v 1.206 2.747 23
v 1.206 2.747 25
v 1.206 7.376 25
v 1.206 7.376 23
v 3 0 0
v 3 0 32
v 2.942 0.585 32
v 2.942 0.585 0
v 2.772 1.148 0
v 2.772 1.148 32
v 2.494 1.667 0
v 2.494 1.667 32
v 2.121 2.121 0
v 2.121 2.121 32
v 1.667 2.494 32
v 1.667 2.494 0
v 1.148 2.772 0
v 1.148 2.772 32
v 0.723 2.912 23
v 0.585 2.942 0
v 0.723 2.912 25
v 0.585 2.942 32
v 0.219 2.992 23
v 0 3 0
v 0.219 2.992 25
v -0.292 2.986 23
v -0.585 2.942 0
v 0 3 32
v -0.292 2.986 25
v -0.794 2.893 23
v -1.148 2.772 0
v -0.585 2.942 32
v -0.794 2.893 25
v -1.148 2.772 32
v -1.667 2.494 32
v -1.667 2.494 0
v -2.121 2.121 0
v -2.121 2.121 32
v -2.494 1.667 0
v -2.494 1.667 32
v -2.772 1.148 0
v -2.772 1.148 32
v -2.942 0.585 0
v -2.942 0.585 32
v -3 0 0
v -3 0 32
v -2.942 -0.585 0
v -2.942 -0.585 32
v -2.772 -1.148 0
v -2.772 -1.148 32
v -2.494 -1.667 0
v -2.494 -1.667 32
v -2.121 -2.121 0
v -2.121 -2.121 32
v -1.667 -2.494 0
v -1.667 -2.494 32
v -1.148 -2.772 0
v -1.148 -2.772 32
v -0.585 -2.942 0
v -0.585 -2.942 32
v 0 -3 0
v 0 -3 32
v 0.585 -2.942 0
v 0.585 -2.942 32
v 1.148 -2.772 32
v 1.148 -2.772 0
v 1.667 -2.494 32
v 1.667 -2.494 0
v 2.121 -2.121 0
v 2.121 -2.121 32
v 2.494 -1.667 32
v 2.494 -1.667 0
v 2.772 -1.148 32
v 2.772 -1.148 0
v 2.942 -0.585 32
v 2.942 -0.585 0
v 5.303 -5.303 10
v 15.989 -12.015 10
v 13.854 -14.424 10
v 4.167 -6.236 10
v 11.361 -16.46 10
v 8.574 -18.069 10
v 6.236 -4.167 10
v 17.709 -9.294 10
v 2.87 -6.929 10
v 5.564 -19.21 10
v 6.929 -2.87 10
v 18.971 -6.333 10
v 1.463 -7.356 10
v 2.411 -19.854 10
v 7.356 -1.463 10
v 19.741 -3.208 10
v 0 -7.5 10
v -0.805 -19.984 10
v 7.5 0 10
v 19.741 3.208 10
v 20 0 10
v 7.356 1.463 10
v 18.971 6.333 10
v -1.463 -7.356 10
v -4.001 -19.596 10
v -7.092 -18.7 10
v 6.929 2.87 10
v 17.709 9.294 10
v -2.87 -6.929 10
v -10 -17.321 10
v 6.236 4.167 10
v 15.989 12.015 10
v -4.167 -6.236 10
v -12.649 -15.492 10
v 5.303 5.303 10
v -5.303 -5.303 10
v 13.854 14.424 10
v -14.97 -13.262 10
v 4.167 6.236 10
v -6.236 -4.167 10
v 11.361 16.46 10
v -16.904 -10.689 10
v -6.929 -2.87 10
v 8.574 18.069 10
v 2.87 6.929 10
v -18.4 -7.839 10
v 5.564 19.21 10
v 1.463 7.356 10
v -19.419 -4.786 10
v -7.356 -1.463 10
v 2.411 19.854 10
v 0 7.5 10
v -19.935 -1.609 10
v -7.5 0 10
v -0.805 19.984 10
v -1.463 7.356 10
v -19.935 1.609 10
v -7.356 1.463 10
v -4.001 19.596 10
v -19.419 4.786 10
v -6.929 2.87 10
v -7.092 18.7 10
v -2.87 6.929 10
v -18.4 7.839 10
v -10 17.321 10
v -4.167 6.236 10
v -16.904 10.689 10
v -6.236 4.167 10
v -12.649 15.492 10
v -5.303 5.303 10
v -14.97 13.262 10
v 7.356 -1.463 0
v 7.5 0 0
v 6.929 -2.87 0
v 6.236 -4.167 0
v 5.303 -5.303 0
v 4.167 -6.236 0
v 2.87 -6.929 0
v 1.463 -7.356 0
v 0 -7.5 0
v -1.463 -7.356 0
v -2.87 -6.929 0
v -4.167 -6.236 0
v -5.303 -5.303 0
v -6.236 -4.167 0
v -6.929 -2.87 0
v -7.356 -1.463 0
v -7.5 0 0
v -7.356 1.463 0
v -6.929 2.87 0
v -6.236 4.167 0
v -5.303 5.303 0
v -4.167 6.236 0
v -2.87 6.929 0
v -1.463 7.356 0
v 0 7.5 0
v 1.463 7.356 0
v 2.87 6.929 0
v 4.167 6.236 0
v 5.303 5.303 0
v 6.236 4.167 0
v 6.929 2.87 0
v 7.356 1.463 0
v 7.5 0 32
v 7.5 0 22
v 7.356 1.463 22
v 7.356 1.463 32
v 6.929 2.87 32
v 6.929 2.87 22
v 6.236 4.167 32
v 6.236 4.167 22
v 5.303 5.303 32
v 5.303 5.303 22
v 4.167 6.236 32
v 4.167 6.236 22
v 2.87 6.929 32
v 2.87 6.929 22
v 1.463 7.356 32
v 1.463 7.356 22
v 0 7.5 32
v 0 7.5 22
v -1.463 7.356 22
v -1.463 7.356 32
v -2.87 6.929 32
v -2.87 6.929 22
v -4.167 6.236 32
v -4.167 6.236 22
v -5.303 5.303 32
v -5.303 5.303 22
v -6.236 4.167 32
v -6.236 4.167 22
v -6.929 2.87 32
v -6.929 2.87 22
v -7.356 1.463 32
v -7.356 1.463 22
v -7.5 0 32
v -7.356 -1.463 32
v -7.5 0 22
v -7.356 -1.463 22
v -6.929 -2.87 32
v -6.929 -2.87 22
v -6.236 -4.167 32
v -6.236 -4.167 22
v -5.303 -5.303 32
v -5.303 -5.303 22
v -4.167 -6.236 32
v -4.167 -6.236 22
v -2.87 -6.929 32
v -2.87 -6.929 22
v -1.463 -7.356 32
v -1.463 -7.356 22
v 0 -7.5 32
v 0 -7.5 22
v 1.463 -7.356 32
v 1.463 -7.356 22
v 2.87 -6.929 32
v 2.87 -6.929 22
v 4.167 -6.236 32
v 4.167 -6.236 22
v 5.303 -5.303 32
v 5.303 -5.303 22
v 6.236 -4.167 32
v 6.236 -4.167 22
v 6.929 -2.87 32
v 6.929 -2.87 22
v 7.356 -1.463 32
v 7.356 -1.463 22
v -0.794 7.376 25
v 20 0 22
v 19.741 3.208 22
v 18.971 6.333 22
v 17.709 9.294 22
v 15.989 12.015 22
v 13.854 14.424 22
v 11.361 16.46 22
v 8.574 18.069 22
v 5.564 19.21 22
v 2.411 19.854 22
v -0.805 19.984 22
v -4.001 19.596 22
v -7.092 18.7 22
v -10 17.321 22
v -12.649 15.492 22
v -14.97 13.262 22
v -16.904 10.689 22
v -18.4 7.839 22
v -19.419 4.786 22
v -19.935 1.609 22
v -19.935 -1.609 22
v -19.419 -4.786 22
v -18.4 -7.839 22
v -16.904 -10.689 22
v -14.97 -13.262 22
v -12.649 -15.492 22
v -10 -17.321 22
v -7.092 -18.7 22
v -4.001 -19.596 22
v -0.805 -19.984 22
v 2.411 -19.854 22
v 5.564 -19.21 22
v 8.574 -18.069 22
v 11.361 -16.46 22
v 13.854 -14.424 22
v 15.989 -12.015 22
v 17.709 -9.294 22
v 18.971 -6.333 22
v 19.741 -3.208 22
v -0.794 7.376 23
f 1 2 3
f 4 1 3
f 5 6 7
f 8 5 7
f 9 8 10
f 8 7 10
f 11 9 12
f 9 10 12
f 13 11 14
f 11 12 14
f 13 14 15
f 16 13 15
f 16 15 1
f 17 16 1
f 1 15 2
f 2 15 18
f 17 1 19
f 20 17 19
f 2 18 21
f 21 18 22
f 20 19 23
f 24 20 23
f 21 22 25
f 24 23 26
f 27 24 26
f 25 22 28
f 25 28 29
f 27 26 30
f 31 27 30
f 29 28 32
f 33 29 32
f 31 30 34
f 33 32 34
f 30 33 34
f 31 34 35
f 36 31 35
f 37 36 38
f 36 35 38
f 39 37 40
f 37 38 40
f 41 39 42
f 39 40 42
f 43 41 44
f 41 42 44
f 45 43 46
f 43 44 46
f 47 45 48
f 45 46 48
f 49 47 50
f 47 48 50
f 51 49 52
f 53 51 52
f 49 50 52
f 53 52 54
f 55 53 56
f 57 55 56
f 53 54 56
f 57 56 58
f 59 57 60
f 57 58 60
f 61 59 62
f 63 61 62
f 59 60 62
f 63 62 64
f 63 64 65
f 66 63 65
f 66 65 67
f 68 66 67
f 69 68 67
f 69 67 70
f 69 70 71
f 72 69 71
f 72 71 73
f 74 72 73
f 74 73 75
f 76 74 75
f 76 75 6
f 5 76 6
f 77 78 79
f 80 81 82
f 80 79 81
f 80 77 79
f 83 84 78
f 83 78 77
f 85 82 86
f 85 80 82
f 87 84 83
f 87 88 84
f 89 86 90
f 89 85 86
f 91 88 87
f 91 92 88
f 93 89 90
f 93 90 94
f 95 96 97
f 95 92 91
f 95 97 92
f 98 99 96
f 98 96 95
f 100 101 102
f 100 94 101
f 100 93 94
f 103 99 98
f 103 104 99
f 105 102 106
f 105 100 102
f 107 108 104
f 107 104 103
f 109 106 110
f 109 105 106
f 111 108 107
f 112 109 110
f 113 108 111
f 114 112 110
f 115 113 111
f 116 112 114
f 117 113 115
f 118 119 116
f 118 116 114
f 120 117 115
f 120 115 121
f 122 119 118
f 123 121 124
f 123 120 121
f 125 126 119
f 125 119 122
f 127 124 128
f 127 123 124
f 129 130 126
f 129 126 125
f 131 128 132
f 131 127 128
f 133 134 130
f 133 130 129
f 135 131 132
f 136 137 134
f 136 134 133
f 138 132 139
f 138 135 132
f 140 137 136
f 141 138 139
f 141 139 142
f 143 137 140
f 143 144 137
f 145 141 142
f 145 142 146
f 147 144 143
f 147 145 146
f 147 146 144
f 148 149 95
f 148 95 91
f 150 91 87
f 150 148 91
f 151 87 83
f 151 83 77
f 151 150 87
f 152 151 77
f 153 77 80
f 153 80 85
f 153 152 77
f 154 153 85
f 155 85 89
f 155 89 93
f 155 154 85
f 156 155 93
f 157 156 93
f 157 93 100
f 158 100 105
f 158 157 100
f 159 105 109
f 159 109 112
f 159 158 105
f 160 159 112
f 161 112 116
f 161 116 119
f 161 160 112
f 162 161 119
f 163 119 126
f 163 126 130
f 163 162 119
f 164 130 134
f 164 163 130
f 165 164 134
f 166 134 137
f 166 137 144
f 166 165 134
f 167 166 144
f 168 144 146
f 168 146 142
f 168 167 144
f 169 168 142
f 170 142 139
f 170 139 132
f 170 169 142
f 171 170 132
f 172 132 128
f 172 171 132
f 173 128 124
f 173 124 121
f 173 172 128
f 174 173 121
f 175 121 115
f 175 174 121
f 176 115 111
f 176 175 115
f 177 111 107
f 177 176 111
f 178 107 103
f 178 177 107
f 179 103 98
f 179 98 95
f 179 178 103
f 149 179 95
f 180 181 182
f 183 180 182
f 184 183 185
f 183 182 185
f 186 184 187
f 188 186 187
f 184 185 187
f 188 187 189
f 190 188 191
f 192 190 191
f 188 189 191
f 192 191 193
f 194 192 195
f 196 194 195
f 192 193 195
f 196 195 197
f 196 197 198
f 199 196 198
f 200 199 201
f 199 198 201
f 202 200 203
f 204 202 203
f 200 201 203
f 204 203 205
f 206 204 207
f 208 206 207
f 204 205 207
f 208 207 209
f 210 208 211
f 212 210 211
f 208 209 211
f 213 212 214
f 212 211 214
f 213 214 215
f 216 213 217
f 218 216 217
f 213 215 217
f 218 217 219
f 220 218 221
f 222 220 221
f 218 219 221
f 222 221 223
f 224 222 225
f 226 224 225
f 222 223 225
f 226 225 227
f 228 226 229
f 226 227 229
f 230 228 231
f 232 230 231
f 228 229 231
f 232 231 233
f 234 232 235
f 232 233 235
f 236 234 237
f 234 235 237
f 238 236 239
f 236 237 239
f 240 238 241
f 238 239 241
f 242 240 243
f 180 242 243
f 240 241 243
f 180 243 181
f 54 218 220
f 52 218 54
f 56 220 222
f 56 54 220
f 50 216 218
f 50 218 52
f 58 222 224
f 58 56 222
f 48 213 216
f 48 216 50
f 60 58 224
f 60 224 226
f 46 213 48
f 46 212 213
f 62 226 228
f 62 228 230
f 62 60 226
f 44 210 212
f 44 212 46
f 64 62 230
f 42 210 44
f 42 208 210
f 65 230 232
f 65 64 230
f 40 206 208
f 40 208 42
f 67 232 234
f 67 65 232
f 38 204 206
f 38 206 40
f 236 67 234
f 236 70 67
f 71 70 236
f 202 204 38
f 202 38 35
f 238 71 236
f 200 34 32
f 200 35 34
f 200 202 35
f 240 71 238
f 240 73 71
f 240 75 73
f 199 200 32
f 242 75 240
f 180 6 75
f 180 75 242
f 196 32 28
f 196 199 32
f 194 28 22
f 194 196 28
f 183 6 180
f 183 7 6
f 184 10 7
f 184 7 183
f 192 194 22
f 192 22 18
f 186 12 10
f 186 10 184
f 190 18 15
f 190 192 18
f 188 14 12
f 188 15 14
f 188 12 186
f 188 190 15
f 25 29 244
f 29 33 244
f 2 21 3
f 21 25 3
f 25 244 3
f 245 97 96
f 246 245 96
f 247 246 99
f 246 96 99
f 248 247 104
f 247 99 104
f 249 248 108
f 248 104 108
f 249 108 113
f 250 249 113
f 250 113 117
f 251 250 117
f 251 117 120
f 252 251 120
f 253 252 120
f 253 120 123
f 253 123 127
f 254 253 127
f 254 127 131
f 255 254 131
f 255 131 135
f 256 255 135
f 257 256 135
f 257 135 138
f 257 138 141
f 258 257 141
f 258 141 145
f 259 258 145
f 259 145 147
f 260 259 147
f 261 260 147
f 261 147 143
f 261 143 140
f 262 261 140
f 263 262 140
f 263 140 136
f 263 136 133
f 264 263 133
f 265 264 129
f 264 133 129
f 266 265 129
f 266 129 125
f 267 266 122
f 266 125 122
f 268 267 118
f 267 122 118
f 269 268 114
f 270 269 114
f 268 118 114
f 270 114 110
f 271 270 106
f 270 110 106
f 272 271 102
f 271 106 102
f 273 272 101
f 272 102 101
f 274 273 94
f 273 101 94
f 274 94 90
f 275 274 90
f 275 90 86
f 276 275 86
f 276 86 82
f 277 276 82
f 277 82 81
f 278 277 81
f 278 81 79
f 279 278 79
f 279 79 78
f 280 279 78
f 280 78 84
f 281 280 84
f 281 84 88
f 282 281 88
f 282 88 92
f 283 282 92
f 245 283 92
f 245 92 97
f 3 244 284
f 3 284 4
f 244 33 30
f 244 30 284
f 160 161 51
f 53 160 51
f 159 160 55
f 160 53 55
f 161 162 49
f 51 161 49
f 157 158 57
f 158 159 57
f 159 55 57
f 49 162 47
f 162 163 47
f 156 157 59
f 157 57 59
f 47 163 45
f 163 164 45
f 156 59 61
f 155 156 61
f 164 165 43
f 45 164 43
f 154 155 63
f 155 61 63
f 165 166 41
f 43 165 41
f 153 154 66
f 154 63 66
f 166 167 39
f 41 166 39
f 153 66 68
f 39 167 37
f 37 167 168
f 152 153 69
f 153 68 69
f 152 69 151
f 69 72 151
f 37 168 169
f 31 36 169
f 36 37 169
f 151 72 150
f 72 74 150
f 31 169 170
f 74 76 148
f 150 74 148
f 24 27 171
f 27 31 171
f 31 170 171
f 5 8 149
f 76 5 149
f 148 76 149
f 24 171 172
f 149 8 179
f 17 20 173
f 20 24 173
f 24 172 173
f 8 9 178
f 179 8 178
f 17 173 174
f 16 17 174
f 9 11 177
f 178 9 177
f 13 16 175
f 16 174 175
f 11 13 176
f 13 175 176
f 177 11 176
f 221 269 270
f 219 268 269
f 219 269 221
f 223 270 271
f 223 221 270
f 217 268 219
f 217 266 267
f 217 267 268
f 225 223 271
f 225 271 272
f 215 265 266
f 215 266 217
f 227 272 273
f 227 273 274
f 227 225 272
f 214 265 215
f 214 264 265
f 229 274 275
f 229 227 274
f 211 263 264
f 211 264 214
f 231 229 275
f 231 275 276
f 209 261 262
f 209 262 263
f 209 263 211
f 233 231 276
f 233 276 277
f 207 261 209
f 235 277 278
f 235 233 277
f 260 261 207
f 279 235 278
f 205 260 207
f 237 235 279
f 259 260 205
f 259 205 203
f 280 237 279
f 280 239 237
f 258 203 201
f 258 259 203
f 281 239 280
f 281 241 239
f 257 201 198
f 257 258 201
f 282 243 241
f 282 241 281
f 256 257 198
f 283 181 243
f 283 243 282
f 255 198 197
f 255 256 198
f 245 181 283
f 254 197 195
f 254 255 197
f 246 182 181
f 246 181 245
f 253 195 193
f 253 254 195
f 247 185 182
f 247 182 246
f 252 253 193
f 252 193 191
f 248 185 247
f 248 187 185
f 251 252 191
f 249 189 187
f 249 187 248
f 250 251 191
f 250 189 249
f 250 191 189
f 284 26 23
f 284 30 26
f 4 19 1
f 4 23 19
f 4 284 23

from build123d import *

# Parameters (mm, degrees)
SKETCH1_R           = 20
BOSS_EXTRUDE1_DEPTH = 32
SKETCH2_R           = 3
CUT_EXTRUDE1_DEPTH  = 32
CUT_EXTRUDE2_START  = -10
SKETCH3_R           = 20
SKETCH3_R_2         = 7.5
CUT_EXTRUDE2_DEPTH  = 10
SKETCH4_R           = 20
SKETCH4_R_2         = 7.5
CUT_EXTRUDE3_DEPTH  = 10
CUT_EXTRUDE4_START  = -7
SKETCH6_W           = 2
SKETCH6_H           = 4.833484819
CUT_EXTRUDE4_DEPTH  = 2


with BuildPart() as part:
    # Sketch1 → Boss-Extrude1 (new body)
    with BuildSketch(Plane.XY):
        Circle(SKETCH1_R)
    extrude(amount=BOSS_EXTRUDE1_DEPTH)

    # Sketch2 → Cut-Extrude1 (cut)
    with BuildSketch(Plane.XY.offset(32)):
        Circle(SKETCH2_R)
    extrude(amount=-CUT_EXTRUDE1_DEPTH, mode=Mode.SUBTRACT)

    # Sketch3 → Cut-Extrude2 (cut)
    with BuildSketch(Plane.XY.offset(32).offset(CUT_EXTRUDE2_START)):
        Circle(SKETCH3_R)
        Circle(SKETCH3_R_2, mode=Mode.SUBTRACT)
    extrude(amount=CUT_EXTRUDE2_DEPTH, mode=Mode.SUBTRACT)

    # Sketch4 → Cut-Extrude3 (cut)
    with BuildSketch(Plane(origin=(0, 0, 0), x_dir=(-1, 0, 0), z_dir=(0, 0, -1))):
        Circle(SKETCH4_R)
        with Locations(Location((0, 0, 0), (0, 0, 180))):
            Circle(SKETCH4_R_2, mode=Mode.SUBTRACT)
    extrude(amount=-CUT_EXTRUDE3_DEPTH, mode=Mode.SUBTRACT)

    # Sketch6 → Cut-Extrude4 (cut)
    with BuildSketch(Plane.XY.offset(32).offset(CUT_EXTRUDE4_START)):
        with Locations((0.206120499, 4.959454821)):
            Rectangle(SKETCH6_W, SKETCH6_H)
    extrude(amount=-CUT_EXTRUDE4_DEPTH, mode=Mode.SUBTRACT)


solid = part.part
